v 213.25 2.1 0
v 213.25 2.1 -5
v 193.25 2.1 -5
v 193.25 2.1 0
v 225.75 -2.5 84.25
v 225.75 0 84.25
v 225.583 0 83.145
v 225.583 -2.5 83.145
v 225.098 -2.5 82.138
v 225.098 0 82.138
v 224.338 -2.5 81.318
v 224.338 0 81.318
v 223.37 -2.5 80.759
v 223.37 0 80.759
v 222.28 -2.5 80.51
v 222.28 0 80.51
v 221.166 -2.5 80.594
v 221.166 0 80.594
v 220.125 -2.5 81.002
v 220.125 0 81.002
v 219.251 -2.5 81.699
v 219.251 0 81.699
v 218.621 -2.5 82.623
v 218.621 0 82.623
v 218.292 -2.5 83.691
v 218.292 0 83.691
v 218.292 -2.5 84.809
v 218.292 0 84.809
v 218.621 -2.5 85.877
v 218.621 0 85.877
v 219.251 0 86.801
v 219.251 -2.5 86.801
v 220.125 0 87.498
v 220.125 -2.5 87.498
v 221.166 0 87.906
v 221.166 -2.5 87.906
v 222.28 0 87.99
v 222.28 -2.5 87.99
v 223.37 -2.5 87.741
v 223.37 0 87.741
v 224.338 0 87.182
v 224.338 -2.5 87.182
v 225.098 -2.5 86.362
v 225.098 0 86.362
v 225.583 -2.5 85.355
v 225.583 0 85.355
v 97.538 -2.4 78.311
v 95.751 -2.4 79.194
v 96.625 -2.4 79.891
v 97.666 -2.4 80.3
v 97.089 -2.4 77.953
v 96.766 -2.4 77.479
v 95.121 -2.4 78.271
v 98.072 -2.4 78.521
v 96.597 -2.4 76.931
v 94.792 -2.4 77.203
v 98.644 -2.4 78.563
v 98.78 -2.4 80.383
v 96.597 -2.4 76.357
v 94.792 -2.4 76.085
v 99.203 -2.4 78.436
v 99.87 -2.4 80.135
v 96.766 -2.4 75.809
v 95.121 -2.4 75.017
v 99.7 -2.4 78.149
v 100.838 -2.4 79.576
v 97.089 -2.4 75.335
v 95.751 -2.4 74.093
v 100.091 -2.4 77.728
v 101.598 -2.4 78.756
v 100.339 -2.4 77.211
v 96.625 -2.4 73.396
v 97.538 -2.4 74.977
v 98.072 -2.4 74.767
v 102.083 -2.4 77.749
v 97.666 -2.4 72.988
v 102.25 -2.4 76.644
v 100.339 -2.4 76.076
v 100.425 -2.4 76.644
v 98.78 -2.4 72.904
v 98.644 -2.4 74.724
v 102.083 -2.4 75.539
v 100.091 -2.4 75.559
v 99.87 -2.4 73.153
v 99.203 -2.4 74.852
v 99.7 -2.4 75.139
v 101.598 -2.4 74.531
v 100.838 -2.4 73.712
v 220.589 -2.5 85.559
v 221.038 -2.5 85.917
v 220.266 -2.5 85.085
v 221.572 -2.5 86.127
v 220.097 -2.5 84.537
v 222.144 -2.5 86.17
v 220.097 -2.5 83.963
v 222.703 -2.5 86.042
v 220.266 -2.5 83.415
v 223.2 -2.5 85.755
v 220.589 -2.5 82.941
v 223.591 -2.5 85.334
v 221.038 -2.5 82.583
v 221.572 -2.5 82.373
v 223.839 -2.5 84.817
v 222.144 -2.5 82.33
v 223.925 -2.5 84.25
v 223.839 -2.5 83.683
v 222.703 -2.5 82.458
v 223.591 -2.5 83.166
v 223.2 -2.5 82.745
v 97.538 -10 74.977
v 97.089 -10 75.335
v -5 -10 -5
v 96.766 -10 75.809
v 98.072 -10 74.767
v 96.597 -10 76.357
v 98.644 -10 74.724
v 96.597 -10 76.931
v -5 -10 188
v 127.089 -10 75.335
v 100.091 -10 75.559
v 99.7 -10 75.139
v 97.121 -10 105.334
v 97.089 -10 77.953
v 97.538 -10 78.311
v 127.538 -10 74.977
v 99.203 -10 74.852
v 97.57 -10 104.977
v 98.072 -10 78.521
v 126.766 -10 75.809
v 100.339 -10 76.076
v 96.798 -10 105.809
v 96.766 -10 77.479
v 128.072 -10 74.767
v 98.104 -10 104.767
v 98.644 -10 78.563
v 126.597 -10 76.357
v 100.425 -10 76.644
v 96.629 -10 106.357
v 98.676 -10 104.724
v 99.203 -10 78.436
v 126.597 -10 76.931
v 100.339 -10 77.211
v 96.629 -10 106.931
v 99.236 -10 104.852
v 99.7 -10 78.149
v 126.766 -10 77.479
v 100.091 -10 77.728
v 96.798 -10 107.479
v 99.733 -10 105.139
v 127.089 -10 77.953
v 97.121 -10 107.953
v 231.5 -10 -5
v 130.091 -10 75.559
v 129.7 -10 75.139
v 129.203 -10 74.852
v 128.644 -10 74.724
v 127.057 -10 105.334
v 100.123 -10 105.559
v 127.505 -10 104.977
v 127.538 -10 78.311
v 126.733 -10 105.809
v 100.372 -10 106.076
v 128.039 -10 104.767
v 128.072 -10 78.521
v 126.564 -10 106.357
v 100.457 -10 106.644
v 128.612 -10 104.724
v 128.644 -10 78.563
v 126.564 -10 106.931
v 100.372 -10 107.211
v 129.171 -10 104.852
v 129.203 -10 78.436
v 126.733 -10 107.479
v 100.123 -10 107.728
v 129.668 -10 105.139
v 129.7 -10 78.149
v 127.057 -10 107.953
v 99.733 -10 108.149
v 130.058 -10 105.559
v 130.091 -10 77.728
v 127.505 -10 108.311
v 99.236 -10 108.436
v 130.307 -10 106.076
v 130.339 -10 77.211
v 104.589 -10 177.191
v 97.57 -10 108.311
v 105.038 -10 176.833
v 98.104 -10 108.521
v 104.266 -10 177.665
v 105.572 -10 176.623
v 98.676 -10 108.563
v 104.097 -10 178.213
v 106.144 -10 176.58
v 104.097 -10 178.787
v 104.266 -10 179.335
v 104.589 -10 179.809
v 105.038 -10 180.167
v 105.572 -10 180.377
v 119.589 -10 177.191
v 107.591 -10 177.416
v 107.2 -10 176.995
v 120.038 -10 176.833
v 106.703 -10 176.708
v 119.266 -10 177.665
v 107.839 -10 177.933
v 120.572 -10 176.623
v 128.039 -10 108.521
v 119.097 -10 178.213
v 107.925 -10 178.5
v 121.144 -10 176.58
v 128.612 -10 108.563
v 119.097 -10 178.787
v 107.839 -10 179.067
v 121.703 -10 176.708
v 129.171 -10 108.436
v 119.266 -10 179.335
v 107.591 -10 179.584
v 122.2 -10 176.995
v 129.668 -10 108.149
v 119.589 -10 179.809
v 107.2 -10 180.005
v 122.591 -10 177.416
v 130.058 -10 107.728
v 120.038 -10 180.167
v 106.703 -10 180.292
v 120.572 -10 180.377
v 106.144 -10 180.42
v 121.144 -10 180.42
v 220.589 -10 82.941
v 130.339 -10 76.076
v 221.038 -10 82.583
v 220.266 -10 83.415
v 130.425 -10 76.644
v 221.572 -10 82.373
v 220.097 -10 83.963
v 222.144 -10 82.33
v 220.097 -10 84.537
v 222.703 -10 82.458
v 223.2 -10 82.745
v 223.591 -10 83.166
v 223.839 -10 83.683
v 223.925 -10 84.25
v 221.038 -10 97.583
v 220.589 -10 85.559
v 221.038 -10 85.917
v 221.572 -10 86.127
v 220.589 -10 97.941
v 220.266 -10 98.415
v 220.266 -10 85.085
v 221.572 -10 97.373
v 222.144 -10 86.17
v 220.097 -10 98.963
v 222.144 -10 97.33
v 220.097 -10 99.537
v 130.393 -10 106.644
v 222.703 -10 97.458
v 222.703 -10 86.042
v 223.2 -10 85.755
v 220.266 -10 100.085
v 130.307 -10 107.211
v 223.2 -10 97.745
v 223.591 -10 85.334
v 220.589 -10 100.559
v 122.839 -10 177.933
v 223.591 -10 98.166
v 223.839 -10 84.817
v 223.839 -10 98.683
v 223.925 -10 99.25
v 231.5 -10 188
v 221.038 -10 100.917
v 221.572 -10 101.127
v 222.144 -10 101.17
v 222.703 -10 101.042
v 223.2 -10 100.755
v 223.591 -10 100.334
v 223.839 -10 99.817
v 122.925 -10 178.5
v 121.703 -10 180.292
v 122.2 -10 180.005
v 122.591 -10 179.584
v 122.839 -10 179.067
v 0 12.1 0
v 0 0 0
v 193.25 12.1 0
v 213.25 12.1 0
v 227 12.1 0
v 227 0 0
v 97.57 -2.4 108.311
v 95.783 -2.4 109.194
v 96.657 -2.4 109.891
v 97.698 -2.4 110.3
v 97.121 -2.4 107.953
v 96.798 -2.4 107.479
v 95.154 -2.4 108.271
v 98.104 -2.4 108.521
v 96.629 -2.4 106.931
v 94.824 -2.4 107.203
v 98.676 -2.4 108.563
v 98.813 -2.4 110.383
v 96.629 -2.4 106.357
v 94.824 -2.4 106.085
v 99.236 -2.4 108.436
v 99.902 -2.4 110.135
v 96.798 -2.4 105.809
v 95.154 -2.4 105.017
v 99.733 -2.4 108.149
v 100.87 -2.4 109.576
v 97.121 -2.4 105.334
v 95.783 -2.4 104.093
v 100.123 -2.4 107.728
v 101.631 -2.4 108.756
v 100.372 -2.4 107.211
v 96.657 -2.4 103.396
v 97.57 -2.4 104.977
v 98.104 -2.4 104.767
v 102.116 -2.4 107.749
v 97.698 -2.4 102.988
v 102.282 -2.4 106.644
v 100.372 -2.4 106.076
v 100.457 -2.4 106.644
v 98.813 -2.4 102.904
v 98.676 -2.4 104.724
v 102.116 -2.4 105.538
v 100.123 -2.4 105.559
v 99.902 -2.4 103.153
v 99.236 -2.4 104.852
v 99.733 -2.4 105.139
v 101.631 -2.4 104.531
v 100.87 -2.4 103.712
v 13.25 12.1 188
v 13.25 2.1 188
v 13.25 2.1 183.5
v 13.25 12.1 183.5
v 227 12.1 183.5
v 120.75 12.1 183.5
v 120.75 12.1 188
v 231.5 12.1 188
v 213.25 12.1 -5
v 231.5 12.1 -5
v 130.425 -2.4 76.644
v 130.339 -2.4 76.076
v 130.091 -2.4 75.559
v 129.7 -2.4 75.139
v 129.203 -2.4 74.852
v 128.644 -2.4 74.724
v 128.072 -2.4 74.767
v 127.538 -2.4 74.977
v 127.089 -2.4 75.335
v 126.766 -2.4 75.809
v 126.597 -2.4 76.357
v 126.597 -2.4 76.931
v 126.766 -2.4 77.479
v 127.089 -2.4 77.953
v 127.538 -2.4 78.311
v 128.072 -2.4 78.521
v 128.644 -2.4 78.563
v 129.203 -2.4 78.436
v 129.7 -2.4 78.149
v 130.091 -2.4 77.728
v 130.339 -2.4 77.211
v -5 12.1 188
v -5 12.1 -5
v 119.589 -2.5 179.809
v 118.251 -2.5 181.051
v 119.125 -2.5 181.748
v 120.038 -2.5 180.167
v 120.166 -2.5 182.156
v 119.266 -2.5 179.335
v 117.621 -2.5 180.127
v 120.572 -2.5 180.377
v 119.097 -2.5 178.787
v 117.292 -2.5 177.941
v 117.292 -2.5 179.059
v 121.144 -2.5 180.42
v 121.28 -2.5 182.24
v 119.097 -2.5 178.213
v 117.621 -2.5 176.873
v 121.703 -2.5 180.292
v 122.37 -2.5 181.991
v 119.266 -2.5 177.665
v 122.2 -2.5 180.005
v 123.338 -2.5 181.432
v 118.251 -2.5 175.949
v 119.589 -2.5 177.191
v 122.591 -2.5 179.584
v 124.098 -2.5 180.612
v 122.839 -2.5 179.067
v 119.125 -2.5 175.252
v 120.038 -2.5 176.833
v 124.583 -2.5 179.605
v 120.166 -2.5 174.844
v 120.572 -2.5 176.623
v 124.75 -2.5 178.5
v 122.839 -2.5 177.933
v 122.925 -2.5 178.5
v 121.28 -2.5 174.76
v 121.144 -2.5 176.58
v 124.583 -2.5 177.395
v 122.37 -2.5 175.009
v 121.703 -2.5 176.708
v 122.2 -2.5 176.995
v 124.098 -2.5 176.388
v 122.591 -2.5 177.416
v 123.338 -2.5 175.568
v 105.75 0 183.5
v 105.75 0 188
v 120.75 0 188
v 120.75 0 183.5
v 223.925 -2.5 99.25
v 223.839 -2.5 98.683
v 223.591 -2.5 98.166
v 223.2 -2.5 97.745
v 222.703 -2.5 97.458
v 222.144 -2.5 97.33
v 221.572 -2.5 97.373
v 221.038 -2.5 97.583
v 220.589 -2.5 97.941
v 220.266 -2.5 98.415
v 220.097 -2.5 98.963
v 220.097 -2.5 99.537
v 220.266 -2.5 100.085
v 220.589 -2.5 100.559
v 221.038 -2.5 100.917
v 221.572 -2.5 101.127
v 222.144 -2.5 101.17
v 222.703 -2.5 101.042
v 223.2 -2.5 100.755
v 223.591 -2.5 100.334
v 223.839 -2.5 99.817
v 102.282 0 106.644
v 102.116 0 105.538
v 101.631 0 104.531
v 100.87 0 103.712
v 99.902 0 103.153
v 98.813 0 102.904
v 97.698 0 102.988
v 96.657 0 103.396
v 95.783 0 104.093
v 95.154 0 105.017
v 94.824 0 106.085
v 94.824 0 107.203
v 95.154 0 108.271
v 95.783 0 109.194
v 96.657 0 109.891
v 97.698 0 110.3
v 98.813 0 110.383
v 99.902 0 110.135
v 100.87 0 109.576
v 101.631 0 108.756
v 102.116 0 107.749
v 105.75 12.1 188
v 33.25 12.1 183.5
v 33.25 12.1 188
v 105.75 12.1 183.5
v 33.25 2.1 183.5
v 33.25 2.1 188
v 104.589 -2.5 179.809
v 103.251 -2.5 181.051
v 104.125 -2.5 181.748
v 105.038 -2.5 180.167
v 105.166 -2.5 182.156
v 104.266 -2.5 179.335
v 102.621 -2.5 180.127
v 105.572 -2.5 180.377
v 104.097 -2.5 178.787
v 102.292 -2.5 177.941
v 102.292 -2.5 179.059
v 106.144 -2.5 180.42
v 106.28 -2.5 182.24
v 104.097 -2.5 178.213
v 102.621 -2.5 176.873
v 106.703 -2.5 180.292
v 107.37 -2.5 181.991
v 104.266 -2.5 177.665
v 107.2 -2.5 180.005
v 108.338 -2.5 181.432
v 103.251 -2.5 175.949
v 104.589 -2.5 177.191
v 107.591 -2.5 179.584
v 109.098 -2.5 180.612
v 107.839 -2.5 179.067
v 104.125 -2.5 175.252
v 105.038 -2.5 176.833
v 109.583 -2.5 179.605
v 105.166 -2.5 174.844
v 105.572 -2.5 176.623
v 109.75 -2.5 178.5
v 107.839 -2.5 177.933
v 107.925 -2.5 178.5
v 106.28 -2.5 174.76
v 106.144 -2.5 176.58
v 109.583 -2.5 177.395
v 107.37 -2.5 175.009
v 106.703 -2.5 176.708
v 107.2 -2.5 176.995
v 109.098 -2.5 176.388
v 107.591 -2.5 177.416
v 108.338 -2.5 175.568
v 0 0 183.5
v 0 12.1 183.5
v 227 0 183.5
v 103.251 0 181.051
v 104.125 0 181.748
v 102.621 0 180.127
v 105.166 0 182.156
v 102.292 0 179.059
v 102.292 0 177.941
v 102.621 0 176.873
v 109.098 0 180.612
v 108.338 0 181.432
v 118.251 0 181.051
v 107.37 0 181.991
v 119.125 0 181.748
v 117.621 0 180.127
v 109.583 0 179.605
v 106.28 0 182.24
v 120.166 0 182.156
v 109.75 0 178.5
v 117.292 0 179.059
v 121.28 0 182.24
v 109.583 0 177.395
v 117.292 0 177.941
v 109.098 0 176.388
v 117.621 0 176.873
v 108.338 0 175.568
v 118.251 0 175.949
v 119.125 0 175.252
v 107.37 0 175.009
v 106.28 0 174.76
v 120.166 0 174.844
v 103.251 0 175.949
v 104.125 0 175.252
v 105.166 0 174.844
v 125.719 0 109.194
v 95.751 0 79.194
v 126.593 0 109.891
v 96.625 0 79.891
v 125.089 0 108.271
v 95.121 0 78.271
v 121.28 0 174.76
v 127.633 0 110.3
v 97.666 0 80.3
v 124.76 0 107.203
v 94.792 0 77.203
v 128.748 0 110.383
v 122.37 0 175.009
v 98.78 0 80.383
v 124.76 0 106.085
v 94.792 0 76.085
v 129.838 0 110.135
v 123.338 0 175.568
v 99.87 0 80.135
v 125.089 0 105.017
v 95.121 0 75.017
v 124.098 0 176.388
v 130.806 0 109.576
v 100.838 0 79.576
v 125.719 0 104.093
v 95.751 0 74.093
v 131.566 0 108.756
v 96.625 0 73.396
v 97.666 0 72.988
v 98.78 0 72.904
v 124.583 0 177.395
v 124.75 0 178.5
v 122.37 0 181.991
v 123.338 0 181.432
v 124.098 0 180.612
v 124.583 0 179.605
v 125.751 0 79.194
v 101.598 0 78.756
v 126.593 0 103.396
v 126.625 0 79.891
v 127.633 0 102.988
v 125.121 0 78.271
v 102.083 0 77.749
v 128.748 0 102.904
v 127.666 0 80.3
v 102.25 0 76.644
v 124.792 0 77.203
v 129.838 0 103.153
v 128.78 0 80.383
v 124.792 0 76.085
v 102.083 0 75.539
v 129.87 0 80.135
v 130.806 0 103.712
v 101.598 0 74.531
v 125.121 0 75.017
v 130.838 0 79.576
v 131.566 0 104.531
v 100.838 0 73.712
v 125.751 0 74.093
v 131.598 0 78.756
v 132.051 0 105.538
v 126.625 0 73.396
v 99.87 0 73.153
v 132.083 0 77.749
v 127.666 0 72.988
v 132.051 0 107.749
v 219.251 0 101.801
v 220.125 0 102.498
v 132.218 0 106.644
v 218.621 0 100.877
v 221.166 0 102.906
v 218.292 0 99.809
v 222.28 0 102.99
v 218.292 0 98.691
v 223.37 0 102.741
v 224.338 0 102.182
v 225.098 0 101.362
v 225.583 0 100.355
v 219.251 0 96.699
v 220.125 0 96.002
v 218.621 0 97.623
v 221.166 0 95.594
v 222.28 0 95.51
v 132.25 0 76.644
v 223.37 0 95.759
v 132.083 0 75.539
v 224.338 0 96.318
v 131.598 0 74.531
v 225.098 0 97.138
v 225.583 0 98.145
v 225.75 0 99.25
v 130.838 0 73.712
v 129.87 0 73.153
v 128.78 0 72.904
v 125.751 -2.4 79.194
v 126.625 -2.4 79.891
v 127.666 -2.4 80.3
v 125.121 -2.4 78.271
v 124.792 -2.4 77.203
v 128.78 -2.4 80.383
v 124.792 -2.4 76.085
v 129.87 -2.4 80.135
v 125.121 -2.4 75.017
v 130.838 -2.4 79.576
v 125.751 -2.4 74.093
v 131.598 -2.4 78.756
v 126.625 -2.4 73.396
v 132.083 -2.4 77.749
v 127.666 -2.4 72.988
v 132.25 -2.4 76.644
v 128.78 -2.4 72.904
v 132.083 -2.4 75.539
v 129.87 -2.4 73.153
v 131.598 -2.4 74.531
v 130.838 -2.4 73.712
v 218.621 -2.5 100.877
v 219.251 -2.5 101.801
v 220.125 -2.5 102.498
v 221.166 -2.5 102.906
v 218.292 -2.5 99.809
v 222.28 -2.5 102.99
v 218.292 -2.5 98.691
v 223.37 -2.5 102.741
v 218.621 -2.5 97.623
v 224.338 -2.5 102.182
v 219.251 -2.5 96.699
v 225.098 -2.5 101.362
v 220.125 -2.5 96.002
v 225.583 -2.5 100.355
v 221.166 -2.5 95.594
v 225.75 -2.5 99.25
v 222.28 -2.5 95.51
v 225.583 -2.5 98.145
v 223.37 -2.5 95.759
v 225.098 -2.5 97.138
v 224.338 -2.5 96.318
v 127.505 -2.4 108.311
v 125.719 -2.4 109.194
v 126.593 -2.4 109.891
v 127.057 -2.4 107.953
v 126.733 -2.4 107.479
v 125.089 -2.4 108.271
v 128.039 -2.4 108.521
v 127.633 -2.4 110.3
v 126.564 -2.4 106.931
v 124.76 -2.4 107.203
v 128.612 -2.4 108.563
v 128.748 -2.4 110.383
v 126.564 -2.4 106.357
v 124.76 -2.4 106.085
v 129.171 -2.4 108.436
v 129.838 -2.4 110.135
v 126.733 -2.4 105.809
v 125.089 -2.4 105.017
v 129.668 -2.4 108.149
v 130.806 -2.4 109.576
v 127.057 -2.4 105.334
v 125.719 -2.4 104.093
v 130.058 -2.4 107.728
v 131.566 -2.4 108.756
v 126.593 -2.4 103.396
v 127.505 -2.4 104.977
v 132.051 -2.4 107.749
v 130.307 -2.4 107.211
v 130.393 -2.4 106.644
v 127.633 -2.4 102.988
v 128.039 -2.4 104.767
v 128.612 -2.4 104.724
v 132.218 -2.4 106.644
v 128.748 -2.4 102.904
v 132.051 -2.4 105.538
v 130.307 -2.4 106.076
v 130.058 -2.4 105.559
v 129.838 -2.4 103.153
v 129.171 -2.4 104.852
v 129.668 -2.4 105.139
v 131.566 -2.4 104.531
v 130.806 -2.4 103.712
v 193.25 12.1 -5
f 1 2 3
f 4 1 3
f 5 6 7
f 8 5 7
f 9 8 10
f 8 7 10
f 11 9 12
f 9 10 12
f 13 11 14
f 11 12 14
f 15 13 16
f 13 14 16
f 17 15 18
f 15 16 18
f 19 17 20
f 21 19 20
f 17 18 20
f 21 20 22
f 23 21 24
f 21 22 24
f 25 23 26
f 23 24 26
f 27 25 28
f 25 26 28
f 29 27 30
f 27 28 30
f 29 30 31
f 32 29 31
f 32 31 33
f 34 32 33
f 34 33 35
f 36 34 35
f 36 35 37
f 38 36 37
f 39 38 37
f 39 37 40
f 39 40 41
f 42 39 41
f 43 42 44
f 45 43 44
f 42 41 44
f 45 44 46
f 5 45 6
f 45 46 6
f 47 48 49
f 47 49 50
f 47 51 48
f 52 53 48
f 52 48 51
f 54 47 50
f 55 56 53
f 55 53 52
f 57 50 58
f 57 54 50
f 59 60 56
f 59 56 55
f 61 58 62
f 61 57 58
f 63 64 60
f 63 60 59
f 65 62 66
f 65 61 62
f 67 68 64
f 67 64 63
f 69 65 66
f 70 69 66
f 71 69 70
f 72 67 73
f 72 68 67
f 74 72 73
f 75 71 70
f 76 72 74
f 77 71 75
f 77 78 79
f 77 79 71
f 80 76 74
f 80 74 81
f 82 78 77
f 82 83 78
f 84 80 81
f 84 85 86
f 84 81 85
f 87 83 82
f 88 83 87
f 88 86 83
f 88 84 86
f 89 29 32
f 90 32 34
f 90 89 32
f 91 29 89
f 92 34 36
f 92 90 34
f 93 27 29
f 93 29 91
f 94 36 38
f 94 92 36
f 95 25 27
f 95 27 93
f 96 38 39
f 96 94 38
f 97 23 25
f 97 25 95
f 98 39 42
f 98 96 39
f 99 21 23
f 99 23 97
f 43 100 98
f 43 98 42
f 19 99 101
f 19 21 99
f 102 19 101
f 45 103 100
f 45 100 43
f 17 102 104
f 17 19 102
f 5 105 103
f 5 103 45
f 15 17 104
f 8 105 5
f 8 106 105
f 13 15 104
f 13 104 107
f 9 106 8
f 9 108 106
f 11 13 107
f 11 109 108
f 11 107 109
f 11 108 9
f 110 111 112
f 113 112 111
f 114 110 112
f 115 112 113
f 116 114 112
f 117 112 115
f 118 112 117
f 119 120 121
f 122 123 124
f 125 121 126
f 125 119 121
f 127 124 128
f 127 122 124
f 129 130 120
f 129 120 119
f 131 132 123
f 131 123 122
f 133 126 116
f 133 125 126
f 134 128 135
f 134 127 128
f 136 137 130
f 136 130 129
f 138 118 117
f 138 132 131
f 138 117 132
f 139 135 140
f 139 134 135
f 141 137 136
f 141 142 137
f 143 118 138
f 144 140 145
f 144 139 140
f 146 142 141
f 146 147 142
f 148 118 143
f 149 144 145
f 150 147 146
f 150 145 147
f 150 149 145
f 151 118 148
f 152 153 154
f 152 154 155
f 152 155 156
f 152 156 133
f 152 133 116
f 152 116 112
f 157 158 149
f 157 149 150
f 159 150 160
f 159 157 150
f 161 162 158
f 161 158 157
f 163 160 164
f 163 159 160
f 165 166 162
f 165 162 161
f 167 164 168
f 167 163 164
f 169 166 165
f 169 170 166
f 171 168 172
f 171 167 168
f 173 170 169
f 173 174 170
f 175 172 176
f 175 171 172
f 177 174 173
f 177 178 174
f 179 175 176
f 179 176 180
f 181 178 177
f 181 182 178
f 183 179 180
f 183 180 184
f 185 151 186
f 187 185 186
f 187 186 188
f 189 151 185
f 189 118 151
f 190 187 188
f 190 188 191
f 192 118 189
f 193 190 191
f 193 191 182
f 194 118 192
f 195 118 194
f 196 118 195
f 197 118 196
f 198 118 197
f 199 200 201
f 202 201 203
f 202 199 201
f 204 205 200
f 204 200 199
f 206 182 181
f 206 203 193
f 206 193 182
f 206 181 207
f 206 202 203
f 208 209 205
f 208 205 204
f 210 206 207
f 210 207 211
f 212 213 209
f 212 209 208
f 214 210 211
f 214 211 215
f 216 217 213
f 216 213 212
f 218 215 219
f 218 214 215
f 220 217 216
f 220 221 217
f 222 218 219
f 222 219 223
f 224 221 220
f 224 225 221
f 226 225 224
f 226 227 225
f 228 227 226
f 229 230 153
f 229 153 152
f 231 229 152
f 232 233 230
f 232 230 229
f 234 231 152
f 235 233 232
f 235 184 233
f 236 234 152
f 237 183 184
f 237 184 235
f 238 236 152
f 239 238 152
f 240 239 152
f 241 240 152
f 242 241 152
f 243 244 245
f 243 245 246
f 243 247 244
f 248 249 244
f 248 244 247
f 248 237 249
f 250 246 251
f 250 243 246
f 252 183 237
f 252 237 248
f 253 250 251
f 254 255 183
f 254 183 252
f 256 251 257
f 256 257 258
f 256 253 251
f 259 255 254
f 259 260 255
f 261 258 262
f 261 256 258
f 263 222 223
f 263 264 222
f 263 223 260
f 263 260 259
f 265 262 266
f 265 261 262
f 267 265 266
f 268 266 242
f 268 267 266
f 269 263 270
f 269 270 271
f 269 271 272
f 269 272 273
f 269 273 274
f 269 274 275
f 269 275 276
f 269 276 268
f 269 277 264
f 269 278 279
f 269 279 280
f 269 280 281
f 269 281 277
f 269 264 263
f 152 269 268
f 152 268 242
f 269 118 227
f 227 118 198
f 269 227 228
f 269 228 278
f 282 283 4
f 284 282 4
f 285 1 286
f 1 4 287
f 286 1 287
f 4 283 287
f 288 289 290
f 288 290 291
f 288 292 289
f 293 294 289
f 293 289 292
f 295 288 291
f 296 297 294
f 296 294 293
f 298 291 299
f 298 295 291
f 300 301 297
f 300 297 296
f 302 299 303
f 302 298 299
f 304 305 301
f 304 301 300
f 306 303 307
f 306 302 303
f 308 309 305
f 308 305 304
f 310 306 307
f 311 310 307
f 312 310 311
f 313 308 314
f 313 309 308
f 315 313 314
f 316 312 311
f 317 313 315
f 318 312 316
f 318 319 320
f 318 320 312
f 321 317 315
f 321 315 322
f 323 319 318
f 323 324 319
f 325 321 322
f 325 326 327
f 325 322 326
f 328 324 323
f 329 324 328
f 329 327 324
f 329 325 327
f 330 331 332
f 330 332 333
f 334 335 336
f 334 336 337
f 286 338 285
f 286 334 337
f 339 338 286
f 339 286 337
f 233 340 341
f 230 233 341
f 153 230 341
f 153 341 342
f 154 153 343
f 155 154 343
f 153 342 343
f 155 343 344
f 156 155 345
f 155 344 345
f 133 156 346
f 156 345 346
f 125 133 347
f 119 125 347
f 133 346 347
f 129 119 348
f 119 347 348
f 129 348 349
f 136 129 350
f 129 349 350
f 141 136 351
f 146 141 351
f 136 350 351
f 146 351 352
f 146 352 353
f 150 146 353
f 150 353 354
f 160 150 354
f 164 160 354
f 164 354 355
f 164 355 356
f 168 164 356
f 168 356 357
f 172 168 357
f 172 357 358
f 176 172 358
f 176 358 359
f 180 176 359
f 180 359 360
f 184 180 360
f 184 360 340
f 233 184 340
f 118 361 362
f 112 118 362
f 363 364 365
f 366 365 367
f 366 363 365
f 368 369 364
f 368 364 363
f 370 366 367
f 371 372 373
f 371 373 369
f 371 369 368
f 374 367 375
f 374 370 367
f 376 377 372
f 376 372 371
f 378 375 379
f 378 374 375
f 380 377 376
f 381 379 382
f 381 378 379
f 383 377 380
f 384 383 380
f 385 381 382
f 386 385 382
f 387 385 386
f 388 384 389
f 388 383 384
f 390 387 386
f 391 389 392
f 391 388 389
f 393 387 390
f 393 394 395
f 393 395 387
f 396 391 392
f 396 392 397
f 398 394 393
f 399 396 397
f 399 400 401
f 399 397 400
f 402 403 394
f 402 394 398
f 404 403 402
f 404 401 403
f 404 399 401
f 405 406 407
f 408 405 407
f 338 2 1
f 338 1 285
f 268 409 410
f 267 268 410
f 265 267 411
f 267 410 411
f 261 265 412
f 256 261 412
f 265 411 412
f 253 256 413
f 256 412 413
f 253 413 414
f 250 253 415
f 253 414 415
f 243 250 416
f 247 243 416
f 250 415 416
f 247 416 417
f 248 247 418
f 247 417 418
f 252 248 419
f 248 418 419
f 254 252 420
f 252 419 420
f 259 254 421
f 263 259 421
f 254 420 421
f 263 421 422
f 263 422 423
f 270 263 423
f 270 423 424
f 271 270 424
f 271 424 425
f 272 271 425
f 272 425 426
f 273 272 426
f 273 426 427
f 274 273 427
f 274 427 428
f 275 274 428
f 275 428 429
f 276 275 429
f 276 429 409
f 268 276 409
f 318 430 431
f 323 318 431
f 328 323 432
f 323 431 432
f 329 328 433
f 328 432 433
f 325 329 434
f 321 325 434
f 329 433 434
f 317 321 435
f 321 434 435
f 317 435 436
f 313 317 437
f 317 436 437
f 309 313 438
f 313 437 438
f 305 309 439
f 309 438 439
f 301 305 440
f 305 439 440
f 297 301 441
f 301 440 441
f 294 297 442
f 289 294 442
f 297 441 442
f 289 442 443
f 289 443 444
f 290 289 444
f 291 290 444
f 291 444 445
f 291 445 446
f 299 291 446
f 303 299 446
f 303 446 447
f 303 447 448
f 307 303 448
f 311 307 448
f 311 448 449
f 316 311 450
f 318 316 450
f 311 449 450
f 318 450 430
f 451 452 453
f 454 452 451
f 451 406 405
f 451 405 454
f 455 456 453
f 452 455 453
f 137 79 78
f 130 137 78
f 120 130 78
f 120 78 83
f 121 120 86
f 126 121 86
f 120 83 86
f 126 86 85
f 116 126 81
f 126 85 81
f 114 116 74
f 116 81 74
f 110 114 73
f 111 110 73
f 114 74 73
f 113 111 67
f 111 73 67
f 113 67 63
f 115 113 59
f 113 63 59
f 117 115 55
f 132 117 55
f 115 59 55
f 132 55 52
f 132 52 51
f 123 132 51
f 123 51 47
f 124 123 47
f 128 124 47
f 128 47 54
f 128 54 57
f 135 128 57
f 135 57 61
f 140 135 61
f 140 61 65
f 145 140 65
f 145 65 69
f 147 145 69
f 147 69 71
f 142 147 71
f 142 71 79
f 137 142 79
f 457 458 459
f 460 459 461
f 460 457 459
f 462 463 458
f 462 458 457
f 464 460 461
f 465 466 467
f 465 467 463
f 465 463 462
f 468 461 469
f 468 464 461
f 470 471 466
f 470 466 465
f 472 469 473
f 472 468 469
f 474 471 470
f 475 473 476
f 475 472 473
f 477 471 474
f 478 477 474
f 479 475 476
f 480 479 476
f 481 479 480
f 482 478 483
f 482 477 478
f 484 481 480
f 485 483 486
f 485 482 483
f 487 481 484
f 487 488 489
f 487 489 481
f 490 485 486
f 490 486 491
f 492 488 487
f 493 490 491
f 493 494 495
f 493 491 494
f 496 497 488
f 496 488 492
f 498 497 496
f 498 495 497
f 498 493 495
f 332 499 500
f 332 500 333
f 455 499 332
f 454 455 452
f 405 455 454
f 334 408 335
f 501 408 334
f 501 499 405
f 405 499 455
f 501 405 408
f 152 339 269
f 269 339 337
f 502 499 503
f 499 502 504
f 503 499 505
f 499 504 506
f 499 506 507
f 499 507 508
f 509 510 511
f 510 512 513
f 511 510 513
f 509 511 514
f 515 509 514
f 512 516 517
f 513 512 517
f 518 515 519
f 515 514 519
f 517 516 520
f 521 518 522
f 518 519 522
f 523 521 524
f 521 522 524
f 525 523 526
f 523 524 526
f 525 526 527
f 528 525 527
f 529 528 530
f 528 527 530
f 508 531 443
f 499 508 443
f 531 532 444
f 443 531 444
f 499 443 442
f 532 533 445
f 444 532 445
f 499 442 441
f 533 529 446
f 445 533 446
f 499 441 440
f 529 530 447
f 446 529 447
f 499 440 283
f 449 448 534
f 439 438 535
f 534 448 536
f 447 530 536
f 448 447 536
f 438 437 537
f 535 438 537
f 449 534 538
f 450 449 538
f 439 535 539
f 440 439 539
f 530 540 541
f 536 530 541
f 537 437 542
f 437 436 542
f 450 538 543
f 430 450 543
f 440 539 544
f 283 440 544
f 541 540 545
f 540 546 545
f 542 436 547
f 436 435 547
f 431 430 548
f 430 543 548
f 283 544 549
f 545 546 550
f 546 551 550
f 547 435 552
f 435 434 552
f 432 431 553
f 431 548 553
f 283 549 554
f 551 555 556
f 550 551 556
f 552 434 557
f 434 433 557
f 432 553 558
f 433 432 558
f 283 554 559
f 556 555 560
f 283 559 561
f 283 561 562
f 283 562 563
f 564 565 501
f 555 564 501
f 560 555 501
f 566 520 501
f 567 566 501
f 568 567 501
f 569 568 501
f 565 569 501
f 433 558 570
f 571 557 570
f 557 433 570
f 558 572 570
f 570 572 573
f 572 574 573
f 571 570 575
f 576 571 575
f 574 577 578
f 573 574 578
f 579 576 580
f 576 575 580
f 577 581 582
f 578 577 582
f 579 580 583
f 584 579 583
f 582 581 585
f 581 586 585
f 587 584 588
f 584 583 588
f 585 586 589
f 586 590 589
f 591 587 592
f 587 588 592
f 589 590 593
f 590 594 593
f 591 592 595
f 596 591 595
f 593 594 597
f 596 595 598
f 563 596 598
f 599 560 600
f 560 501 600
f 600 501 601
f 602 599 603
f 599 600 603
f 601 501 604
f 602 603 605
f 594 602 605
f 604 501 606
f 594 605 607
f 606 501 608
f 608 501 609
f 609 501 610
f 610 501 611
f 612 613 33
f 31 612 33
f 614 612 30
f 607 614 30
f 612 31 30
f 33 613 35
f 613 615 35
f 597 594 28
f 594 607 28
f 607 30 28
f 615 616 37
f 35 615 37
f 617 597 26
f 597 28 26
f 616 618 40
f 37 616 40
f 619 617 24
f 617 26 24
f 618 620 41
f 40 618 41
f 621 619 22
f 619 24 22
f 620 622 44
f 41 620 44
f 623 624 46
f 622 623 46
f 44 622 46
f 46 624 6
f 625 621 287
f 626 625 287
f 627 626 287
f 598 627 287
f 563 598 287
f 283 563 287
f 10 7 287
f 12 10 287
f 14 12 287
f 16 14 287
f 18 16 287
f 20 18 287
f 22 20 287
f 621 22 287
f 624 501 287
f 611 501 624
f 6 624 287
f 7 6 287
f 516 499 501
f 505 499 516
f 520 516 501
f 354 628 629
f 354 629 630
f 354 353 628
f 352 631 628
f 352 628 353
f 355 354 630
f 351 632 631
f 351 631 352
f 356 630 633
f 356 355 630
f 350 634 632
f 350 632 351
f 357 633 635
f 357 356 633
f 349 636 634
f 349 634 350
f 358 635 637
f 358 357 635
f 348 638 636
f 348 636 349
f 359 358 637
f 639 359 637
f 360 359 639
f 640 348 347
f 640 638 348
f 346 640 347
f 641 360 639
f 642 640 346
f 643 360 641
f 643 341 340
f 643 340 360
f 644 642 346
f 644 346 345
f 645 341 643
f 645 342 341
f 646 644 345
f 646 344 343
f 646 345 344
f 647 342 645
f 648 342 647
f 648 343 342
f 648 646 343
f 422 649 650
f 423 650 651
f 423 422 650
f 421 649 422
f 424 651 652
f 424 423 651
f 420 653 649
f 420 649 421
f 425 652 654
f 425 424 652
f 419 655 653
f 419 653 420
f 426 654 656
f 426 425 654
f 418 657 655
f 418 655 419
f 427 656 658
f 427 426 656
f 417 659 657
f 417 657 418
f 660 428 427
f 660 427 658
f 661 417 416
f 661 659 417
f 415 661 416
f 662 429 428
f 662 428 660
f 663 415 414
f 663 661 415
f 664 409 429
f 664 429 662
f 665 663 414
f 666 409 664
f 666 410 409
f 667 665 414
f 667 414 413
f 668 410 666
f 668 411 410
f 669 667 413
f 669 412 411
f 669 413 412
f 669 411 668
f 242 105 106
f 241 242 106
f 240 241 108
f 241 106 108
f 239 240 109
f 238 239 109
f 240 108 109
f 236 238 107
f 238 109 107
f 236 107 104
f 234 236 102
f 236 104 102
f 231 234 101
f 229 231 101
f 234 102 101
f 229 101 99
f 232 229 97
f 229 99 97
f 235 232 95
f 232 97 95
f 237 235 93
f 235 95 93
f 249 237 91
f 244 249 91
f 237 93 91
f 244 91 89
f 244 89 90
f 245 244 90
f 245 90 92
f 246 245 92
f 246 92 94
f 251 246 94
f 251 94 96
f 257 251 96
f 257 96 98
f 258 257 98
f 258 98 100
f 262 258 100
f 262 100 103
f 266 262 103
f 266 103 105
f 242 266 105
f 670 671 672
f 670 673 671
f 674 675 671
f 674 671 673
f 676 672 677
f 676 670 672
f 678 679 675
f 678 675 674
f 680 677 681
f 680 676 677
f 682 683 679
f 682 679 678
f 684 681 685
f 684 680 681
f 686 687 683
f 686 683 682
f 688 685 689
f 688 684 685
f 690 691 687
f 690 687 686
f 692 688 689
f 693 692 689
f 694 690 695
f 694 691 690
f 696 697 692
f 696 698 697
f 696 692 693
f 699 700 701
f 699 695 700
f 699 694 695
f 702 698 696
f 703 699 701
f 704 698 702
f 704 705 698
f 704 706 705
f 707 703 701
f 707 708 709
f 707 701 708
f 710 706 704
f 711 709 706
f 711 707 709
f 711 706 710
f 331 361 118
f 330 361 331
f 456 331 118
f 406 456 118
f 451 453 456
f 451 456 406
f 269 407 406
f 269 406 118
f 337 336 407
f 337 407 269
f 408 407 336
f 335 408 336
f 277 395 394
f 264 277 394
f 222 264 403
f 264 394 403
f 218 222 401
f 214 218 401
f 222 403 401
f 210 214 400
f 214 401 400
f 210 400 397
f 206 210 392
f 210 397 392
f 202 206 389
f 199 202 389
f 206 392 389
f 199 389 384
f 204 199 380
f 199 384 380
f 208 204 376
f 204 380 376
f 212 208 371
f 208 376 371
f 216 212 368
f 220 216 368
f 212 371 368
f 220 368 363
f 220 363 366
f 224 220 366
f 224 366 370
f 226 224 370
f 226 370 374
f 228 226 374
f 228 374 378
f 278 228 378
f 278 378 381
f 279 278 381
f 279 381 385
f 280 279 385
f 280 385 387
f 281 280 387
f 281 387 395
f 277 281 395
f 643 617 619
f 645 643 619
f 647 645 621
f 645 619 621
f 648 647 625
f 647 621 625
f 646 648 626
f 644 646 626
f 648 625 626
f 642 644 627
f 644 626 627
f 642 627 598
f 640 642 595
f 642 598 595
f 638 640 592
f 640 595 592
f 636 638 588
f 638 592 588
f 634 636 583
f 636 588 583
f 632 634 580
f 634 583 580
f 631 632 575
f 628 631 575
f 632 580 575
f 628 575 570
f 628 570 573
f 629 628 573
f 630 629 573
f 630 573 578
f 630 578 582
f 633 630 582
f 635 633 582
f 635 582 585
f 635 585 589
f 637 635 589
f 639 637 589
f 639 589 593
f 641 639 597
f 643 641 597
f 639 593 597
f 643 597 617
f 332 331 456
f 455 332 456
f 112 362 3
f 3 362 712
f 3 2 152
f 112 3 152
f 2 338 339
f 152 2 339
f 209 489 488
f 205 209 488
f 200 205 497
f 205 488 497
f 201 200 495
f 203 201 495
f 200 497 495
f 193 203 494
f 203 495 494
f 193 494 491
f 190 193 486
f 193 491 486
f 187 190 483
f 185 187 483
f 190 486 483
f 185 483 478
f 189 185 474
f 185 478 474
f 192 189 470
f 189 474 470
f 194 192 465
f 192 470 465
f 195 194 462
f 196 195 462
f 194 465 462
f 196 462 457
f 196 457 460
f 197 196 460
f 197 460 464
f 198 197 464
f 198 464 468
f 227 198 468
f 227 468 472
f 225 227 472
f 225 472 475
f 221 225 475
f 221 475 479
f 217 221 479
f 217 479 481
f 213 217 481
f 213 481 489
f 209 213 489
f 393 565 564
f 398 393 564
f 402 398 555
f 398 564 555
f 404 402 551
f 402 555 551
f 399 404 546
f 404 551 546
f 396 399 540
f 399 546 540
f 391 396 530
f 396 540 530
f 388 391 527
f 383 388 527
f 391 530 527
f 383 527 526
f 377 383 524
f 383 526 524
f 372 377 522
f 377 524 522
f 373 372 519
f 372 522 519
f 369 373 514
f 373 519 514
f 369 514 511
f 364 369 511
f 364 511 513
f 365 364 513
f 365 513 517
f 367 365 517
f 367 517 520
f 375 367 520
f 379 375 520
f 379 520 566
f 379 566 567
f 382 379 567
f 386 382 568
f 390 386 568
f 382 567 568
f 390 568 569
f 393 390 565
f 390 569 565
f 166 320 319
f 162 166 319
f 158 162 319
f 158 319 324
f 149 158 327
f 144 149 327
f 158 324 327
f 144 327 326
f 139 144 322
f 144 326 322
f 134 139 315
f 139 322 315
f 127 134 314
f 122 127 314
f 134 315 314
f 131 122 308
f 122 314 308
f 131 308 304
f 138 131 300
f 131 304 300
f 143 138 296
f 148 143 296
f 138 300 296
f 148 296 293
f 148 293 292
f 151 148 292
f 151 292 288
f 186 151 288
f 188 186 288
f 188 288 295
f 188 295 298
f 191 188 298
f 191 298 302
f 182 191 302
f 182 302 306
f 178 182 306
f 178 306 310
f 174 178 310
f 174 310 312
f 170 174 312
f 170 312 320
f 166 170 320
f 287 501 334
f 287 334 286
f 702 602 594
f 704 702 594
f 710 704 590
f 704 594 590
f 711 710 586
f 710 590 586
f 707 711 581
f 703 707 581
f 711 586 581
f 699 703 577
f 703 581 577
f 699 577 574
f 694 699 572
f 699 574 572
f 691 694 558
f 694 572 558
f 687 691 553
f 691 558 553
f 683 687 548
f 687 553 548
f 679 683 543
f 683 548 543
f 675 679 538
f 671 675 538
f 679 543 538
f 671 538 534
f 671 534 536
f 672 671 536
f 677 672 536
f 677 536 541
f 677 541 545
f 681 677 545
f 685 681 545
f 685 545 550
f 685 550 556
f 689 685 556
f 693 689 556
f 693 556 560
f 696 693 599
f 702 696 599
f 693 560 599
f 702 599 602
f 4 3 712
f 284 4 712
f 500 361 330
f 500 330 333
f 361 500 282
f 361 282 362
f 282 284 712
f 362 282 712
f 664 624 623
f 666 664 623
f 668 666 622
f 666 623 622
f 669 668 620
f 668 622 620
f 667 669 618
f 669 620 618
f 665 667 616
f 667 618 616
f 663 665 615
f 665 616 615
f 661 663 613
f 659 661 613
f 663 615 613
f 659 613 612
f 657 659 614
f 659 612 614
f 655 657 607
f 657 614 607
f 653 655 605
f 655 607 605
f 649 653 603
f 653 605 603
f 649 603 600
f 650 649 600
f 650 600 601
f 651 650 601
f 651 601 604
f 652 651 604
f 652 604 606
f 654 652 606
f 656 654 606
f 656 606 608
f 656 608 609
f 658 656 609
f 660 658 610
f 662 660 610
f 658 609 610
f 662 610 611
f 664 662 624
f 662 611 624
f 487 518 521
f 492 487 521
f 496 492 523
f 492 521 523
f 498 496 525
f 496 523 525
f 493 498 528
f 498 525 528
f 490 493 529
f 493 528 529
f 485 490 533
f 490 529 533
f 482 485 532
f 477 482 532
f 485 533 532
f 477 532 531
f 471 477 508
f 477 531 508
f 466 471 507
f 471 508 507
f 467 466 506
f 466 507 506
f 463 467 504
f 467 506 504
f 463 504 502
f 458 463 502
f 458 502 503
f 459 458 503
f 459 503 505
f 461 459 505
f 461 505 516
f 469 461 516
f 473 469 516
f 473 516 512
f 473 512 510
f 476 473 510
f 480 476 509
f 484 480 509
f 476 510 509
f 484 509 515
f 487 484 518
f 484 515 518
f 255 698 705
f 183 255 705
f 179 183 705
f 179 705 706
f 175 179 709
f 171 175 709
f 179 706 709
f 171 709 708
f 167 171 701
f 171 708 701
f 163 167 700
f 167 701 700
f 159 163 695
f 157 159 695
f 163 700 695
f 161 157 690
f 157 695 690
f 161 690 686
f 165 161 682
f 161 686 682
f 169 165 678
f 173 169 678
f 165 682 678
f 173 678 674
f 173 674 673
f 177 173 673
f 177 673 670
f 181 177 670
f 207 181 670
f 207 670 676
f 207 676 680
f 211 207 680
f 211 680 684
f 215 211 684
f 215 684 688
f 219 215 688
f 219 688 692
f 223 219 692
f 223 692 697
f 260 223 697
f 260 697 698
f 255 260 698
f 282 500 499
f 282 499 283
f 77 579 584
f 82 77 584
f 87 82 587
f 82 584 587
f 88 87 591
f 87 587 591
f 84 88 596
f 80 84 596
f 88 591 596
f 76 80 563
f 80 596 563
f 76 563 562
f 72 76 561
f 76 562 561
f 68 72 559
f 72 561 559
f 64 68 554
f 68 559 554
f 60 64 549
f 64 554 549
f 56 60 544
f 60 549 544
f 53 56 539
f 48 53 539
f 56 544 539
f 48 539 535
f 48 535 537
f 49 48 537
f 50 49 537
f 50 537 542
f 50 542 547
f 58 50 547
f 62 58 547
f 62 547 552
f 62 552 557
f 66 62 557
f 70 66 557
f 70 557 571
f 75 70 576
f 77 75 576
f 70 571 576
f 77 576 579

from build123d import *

# Parameters (mm, degrees)
SKETCH2_W                = 236.5
SKETCH2_H                = 193
SKETCH2_W_2              = 227
SKETCH2_H_2              = 183.5
BOSS_EXTRUDE1_DEPTH      = 12.1
SKETCH3_W                = 236.5
SKETCH3_H                = 193
BOSS_EXTRUDE2_DEPTH      = 10
SKETCH4_W                = 10
SKETCH4_H                = 10
CUT_EXTRUDE1_DEPTH       = 5
SKETCH7_W                = 20
SKETCH7_H                = 10
CUT_EXTRUDE2_DEPTH       = 5
SKETCH8_W                = 20
SKETCH8_H                = 10
CUT_EXTRUDE3_DEPTH       = 5
SKETCH32_W               = 20
SKETCH32_H               = 12.1
CUT_EXTRUDE14_DEPTH      = 6
SKETCH34_R               = 1.925
CUT_EXTRUDE16_DEPTH      = 11
SKETCH35_R               = 3.75
SKETCH35_R_2             = 1.925
CUT_EXTRUDE17_DEPTH      = 2.4
SKETCH36_W               = 20
SKETCH36_H               = 12.1
BOSS_EXTRUDE9_DEPTH      = 5
SKETCH37_W               = 15
SKETCH37_H               = 12.1
CUT_EXTRUDE18_DEPTH      = 5
SKETCH44_R               = 1.925
CUT_EXTRUDE21_DEPTH      = 13.1
CUT_EXTRUDE21_DEPTH_BACK = 11
SKETCH44_4_R             = 3.75
CUT_EXTRUDE22_DEPTH      = 2.5
SKETCH47_R               = 3.75
SKETCH47_R_2             = 1.925
CUT_EXTRUDE23_DEPTH      = 2.5
SKETCH47_2_R             = 1.925
CUT_EXTRUDE24_DEPTH      = 11


with BuildPart() as part:
    # Sketch2 → Boss-Extrude1 (new body)
    with BuildSketch(Plane(origin=(0, 0, 0), x_dir=(1, 0, 0), z_dir=(0, 1, 0))):
        with Locations((113.25, -91.5)):
            Rectangle(SKETCH2_W, SKETCH2_H)
        with Locations((113.5, -91.75)):
            Rectangle(SKETCH2_W_2, SKETCH2_H_2, mode=Mode.SUBTRACT)
    extrude(amount=BOSS_EXTRUDE1_DEPTH)

    # Sketch3 → Boss-Extrude2 (add)
    with BuildSketch(Plane.XZ):
        with Locations((113.25, 91.5)):
            Rectangle(SKETCH3_W, SKETCH3_H)
    extrude(amount=BOSS_EXTRUDE2_DEPTH)

    # Sketch4 → Cut-Extrude1 (cut)
    with BuildSketch(Plane.ZY.offset(5)):
        with Locations((96.5, 7.1)):
            Rectangle(SKETCH4_W, SKETCH4_H)
        with Locations((86.5, 7.1)):
            Rectangle(SKETCH4_W, SKETCH4_H)
    extrude(amount=-CUT_EXTRUDE1_DEPTH, mode=Mode.SUBTRACT)

    # Sketch7 → Cut-Extrude2 (cut)
    with BuildSketch(Plane.XY.offset(188)):
        with Locations((23.25, 7.1)):
            Rectangle(SKETCH7_W, SKETCH7_H)
    extrude(amount=-CUT_EXTRUDE2_DEPTH, mode=Mode.SUBTRACT)

    # Sketch8 → Cut-Extrude3 (cut)
    with BuildSketch(Plane(origin=(0, 0, -5), x_dir=(-1, 0, 0), z_dir=(0, 0, -1))):
        with Locations((-203.25, 7.1)):
            Rectangle(SKETCH8_W, SKETCH8_H)
    extrude(amount=-CUT_EXTRUDE3_DEPTH, mode=Mode.SUBTRACT)

    # Sketch32 → Cut-Extrude14 (cut, through all)
    with BuildSketch(Plane(origin=(0, 0, 0), x_dir=(0, 0, -1), z_dir=(1, 0, 0))):
        with Locations((-91.5, 6.05)):
            Rectangle(SKETCH32_W, SKETCH32_H)
    extrude(amount=-CUT_EXTRUDE14_DEPTH, mode=Mode.SUBTRACT)

    # Sketch34 → Cut-Extrude16 (cut, through all)
    with BuildSketch(Plane(origin=(0, 0, 0), x_dir=(1, 0, 0), z_dir=(0, 1, 0))):
        with Locations((128.5, -76.64384905)):
            Circle(SKETCH34_R)
        with Locations((128.467672433, -106.643831632)):
            Circle(SKETCH34_R)
        with Locations((98.532327567, -106.643831632)):
            Circle(SKETCH34_R)
        with Locations((98.5, -76.64384905)):
            Circle(SKETCH34_R)
    extrude(amount=-CUT_EXTRUDE16_DEPTH, mode=Mode.SUBTRACT)

    # Sketch35 → Cut-Extrude17 (cut)
    with BuildSketch(Plane(origin=(0, 0, 0), x_dir=(1, 0, 0), z_dir=(0, 1, 0))):
        with Locations((98.5, -76.64384905)):
            Circle(SKETCH35_R)
        with Locations((98.5, -76.64384905)):
            Circle(SKETCH35_R_2, mode=Mode.SUBTRACT)
        with Locations((128.5, -76.64384905)):
            Circle(SKETCH35_R)
        with Locations((128.5, -76.64384905)):
            Circle(SKETCH35_R_2, mode=Mode.SUBTRACT)
        with Locations((98.532327567, -106.643831632)):
            Circle(SKETCH35_R)
        with Locations((98.532327567, -106.643831632)):
            Circle(SKETCH35_R_2, mode=Mode.SUBTRACT)
        with Locations((128.467672433, -106.643831632)):
            Circle(SKETCH35_R)
    extrude(amount=-CUT_EXTRUDE17_DEPTH, mode=Mode.SUBTRACT)

    # Sketch36 → Boss-Extrude9 (add)
    with BuildSketch(Plane(origin=(0, 0, 0), x_dir=(0, 0, -1), z_dir=(1, 0, 0))):
        with Locations((-91.5, 6.05)):
            Rectangle(SKETCH36_W, SKETCH36_H)
    extrude(amount=-BOSS_EXTRUDE9_DEPTH)

    # Sketch37 → Cut-Extrude18 (cut)
    with BuildSketch(Plane.XY.offset(188)):
        with Locations((113.25, 6.0501)):
            Rectangle(SKETCH37_W, SKETCH37_H)
    extrude(amount=-CUT_EXTRUDE18_DEPTH, mode=Mode.SUBTRACT)

    # Sketch44 → Cut-Extrude21 (cut, two sides)
    with BuildSketch(Plane(origin=(0, 0, 0), x_dir=(1, 0, 0), z_dir=(0, 1, 0))) as cut_extrude21_sk:
        with Locations((121, -178.5)):
            Circle(SKETCH44_R)
        with Locations((106, -178.5)):
            Circle(SKETCH44_R)
    extrude(amount=CUT_EXTRUDE21_DEPTH, mode=Mode.SUBTRACT)
    extrude(cut_extrude21_sk.sketch, amount=-CUT_EXTRUDE21_DEPTH_BACK, mode=Mode.SUBTRACT)

    # Sketch44<4> → Cut-Extrude22 (cut)
    with BuildSketch(Plane(origin=(0, 0, 0), x_dir=(1, 0, 0), z_dir=(0, 1, 0))):
        with Locations((121, -178.5)):
            Circle(SKETCH44_4_R)
        with Locations((106, -178.5)):
            Circle(SKETCH44_4_R)
    extrude(amount=-CUT_EXTRUDE22_DEPTH, mode=Mode.SUBTRACT)

    # Sketch47 → Cut-Extrude23 (cut)
    with BuildSketch(Plane(origin=(0, 0, 0), x_dir=(1, 0, 0), z_dir=(0, 1, 0))):
        with Locations((222, -84.25)):
            Circle(SKETCH47_R)
        with Locations((222, -84.25)):
            Circle(SKETCH47_R_2, mode=Mode.SUBTRACT)
        with Locations((222, -99.25)):
            Circle(SKETCH47_R)
        with Locations((222, -99.25)):
            Circle(SKETCH47_R_2, mode=Mode.SUBTRACT)
    extrude(amount=-CUT_EXTRUDE23_DEPTH, mode=Mode.SUBTRACT)

    # Sketch47<2> → Cut-Extrude24 (cut, through all)
    with BuildSketch(Plane(origin=(0, 0, 0), x_dir=(1, 0, 0), z_dir=(0, 1, 0))):
        with Locations((222, -84.25)):
            Circle(SKETCH47_2_R)
        with Locations((222, -99.25)):
            Circle(SKETCH47_2_R)
    extrude(amount=-CUT_EXTRUDE24_DEPTH, mode=Mode.SUBTRACT)


solid = part.part
